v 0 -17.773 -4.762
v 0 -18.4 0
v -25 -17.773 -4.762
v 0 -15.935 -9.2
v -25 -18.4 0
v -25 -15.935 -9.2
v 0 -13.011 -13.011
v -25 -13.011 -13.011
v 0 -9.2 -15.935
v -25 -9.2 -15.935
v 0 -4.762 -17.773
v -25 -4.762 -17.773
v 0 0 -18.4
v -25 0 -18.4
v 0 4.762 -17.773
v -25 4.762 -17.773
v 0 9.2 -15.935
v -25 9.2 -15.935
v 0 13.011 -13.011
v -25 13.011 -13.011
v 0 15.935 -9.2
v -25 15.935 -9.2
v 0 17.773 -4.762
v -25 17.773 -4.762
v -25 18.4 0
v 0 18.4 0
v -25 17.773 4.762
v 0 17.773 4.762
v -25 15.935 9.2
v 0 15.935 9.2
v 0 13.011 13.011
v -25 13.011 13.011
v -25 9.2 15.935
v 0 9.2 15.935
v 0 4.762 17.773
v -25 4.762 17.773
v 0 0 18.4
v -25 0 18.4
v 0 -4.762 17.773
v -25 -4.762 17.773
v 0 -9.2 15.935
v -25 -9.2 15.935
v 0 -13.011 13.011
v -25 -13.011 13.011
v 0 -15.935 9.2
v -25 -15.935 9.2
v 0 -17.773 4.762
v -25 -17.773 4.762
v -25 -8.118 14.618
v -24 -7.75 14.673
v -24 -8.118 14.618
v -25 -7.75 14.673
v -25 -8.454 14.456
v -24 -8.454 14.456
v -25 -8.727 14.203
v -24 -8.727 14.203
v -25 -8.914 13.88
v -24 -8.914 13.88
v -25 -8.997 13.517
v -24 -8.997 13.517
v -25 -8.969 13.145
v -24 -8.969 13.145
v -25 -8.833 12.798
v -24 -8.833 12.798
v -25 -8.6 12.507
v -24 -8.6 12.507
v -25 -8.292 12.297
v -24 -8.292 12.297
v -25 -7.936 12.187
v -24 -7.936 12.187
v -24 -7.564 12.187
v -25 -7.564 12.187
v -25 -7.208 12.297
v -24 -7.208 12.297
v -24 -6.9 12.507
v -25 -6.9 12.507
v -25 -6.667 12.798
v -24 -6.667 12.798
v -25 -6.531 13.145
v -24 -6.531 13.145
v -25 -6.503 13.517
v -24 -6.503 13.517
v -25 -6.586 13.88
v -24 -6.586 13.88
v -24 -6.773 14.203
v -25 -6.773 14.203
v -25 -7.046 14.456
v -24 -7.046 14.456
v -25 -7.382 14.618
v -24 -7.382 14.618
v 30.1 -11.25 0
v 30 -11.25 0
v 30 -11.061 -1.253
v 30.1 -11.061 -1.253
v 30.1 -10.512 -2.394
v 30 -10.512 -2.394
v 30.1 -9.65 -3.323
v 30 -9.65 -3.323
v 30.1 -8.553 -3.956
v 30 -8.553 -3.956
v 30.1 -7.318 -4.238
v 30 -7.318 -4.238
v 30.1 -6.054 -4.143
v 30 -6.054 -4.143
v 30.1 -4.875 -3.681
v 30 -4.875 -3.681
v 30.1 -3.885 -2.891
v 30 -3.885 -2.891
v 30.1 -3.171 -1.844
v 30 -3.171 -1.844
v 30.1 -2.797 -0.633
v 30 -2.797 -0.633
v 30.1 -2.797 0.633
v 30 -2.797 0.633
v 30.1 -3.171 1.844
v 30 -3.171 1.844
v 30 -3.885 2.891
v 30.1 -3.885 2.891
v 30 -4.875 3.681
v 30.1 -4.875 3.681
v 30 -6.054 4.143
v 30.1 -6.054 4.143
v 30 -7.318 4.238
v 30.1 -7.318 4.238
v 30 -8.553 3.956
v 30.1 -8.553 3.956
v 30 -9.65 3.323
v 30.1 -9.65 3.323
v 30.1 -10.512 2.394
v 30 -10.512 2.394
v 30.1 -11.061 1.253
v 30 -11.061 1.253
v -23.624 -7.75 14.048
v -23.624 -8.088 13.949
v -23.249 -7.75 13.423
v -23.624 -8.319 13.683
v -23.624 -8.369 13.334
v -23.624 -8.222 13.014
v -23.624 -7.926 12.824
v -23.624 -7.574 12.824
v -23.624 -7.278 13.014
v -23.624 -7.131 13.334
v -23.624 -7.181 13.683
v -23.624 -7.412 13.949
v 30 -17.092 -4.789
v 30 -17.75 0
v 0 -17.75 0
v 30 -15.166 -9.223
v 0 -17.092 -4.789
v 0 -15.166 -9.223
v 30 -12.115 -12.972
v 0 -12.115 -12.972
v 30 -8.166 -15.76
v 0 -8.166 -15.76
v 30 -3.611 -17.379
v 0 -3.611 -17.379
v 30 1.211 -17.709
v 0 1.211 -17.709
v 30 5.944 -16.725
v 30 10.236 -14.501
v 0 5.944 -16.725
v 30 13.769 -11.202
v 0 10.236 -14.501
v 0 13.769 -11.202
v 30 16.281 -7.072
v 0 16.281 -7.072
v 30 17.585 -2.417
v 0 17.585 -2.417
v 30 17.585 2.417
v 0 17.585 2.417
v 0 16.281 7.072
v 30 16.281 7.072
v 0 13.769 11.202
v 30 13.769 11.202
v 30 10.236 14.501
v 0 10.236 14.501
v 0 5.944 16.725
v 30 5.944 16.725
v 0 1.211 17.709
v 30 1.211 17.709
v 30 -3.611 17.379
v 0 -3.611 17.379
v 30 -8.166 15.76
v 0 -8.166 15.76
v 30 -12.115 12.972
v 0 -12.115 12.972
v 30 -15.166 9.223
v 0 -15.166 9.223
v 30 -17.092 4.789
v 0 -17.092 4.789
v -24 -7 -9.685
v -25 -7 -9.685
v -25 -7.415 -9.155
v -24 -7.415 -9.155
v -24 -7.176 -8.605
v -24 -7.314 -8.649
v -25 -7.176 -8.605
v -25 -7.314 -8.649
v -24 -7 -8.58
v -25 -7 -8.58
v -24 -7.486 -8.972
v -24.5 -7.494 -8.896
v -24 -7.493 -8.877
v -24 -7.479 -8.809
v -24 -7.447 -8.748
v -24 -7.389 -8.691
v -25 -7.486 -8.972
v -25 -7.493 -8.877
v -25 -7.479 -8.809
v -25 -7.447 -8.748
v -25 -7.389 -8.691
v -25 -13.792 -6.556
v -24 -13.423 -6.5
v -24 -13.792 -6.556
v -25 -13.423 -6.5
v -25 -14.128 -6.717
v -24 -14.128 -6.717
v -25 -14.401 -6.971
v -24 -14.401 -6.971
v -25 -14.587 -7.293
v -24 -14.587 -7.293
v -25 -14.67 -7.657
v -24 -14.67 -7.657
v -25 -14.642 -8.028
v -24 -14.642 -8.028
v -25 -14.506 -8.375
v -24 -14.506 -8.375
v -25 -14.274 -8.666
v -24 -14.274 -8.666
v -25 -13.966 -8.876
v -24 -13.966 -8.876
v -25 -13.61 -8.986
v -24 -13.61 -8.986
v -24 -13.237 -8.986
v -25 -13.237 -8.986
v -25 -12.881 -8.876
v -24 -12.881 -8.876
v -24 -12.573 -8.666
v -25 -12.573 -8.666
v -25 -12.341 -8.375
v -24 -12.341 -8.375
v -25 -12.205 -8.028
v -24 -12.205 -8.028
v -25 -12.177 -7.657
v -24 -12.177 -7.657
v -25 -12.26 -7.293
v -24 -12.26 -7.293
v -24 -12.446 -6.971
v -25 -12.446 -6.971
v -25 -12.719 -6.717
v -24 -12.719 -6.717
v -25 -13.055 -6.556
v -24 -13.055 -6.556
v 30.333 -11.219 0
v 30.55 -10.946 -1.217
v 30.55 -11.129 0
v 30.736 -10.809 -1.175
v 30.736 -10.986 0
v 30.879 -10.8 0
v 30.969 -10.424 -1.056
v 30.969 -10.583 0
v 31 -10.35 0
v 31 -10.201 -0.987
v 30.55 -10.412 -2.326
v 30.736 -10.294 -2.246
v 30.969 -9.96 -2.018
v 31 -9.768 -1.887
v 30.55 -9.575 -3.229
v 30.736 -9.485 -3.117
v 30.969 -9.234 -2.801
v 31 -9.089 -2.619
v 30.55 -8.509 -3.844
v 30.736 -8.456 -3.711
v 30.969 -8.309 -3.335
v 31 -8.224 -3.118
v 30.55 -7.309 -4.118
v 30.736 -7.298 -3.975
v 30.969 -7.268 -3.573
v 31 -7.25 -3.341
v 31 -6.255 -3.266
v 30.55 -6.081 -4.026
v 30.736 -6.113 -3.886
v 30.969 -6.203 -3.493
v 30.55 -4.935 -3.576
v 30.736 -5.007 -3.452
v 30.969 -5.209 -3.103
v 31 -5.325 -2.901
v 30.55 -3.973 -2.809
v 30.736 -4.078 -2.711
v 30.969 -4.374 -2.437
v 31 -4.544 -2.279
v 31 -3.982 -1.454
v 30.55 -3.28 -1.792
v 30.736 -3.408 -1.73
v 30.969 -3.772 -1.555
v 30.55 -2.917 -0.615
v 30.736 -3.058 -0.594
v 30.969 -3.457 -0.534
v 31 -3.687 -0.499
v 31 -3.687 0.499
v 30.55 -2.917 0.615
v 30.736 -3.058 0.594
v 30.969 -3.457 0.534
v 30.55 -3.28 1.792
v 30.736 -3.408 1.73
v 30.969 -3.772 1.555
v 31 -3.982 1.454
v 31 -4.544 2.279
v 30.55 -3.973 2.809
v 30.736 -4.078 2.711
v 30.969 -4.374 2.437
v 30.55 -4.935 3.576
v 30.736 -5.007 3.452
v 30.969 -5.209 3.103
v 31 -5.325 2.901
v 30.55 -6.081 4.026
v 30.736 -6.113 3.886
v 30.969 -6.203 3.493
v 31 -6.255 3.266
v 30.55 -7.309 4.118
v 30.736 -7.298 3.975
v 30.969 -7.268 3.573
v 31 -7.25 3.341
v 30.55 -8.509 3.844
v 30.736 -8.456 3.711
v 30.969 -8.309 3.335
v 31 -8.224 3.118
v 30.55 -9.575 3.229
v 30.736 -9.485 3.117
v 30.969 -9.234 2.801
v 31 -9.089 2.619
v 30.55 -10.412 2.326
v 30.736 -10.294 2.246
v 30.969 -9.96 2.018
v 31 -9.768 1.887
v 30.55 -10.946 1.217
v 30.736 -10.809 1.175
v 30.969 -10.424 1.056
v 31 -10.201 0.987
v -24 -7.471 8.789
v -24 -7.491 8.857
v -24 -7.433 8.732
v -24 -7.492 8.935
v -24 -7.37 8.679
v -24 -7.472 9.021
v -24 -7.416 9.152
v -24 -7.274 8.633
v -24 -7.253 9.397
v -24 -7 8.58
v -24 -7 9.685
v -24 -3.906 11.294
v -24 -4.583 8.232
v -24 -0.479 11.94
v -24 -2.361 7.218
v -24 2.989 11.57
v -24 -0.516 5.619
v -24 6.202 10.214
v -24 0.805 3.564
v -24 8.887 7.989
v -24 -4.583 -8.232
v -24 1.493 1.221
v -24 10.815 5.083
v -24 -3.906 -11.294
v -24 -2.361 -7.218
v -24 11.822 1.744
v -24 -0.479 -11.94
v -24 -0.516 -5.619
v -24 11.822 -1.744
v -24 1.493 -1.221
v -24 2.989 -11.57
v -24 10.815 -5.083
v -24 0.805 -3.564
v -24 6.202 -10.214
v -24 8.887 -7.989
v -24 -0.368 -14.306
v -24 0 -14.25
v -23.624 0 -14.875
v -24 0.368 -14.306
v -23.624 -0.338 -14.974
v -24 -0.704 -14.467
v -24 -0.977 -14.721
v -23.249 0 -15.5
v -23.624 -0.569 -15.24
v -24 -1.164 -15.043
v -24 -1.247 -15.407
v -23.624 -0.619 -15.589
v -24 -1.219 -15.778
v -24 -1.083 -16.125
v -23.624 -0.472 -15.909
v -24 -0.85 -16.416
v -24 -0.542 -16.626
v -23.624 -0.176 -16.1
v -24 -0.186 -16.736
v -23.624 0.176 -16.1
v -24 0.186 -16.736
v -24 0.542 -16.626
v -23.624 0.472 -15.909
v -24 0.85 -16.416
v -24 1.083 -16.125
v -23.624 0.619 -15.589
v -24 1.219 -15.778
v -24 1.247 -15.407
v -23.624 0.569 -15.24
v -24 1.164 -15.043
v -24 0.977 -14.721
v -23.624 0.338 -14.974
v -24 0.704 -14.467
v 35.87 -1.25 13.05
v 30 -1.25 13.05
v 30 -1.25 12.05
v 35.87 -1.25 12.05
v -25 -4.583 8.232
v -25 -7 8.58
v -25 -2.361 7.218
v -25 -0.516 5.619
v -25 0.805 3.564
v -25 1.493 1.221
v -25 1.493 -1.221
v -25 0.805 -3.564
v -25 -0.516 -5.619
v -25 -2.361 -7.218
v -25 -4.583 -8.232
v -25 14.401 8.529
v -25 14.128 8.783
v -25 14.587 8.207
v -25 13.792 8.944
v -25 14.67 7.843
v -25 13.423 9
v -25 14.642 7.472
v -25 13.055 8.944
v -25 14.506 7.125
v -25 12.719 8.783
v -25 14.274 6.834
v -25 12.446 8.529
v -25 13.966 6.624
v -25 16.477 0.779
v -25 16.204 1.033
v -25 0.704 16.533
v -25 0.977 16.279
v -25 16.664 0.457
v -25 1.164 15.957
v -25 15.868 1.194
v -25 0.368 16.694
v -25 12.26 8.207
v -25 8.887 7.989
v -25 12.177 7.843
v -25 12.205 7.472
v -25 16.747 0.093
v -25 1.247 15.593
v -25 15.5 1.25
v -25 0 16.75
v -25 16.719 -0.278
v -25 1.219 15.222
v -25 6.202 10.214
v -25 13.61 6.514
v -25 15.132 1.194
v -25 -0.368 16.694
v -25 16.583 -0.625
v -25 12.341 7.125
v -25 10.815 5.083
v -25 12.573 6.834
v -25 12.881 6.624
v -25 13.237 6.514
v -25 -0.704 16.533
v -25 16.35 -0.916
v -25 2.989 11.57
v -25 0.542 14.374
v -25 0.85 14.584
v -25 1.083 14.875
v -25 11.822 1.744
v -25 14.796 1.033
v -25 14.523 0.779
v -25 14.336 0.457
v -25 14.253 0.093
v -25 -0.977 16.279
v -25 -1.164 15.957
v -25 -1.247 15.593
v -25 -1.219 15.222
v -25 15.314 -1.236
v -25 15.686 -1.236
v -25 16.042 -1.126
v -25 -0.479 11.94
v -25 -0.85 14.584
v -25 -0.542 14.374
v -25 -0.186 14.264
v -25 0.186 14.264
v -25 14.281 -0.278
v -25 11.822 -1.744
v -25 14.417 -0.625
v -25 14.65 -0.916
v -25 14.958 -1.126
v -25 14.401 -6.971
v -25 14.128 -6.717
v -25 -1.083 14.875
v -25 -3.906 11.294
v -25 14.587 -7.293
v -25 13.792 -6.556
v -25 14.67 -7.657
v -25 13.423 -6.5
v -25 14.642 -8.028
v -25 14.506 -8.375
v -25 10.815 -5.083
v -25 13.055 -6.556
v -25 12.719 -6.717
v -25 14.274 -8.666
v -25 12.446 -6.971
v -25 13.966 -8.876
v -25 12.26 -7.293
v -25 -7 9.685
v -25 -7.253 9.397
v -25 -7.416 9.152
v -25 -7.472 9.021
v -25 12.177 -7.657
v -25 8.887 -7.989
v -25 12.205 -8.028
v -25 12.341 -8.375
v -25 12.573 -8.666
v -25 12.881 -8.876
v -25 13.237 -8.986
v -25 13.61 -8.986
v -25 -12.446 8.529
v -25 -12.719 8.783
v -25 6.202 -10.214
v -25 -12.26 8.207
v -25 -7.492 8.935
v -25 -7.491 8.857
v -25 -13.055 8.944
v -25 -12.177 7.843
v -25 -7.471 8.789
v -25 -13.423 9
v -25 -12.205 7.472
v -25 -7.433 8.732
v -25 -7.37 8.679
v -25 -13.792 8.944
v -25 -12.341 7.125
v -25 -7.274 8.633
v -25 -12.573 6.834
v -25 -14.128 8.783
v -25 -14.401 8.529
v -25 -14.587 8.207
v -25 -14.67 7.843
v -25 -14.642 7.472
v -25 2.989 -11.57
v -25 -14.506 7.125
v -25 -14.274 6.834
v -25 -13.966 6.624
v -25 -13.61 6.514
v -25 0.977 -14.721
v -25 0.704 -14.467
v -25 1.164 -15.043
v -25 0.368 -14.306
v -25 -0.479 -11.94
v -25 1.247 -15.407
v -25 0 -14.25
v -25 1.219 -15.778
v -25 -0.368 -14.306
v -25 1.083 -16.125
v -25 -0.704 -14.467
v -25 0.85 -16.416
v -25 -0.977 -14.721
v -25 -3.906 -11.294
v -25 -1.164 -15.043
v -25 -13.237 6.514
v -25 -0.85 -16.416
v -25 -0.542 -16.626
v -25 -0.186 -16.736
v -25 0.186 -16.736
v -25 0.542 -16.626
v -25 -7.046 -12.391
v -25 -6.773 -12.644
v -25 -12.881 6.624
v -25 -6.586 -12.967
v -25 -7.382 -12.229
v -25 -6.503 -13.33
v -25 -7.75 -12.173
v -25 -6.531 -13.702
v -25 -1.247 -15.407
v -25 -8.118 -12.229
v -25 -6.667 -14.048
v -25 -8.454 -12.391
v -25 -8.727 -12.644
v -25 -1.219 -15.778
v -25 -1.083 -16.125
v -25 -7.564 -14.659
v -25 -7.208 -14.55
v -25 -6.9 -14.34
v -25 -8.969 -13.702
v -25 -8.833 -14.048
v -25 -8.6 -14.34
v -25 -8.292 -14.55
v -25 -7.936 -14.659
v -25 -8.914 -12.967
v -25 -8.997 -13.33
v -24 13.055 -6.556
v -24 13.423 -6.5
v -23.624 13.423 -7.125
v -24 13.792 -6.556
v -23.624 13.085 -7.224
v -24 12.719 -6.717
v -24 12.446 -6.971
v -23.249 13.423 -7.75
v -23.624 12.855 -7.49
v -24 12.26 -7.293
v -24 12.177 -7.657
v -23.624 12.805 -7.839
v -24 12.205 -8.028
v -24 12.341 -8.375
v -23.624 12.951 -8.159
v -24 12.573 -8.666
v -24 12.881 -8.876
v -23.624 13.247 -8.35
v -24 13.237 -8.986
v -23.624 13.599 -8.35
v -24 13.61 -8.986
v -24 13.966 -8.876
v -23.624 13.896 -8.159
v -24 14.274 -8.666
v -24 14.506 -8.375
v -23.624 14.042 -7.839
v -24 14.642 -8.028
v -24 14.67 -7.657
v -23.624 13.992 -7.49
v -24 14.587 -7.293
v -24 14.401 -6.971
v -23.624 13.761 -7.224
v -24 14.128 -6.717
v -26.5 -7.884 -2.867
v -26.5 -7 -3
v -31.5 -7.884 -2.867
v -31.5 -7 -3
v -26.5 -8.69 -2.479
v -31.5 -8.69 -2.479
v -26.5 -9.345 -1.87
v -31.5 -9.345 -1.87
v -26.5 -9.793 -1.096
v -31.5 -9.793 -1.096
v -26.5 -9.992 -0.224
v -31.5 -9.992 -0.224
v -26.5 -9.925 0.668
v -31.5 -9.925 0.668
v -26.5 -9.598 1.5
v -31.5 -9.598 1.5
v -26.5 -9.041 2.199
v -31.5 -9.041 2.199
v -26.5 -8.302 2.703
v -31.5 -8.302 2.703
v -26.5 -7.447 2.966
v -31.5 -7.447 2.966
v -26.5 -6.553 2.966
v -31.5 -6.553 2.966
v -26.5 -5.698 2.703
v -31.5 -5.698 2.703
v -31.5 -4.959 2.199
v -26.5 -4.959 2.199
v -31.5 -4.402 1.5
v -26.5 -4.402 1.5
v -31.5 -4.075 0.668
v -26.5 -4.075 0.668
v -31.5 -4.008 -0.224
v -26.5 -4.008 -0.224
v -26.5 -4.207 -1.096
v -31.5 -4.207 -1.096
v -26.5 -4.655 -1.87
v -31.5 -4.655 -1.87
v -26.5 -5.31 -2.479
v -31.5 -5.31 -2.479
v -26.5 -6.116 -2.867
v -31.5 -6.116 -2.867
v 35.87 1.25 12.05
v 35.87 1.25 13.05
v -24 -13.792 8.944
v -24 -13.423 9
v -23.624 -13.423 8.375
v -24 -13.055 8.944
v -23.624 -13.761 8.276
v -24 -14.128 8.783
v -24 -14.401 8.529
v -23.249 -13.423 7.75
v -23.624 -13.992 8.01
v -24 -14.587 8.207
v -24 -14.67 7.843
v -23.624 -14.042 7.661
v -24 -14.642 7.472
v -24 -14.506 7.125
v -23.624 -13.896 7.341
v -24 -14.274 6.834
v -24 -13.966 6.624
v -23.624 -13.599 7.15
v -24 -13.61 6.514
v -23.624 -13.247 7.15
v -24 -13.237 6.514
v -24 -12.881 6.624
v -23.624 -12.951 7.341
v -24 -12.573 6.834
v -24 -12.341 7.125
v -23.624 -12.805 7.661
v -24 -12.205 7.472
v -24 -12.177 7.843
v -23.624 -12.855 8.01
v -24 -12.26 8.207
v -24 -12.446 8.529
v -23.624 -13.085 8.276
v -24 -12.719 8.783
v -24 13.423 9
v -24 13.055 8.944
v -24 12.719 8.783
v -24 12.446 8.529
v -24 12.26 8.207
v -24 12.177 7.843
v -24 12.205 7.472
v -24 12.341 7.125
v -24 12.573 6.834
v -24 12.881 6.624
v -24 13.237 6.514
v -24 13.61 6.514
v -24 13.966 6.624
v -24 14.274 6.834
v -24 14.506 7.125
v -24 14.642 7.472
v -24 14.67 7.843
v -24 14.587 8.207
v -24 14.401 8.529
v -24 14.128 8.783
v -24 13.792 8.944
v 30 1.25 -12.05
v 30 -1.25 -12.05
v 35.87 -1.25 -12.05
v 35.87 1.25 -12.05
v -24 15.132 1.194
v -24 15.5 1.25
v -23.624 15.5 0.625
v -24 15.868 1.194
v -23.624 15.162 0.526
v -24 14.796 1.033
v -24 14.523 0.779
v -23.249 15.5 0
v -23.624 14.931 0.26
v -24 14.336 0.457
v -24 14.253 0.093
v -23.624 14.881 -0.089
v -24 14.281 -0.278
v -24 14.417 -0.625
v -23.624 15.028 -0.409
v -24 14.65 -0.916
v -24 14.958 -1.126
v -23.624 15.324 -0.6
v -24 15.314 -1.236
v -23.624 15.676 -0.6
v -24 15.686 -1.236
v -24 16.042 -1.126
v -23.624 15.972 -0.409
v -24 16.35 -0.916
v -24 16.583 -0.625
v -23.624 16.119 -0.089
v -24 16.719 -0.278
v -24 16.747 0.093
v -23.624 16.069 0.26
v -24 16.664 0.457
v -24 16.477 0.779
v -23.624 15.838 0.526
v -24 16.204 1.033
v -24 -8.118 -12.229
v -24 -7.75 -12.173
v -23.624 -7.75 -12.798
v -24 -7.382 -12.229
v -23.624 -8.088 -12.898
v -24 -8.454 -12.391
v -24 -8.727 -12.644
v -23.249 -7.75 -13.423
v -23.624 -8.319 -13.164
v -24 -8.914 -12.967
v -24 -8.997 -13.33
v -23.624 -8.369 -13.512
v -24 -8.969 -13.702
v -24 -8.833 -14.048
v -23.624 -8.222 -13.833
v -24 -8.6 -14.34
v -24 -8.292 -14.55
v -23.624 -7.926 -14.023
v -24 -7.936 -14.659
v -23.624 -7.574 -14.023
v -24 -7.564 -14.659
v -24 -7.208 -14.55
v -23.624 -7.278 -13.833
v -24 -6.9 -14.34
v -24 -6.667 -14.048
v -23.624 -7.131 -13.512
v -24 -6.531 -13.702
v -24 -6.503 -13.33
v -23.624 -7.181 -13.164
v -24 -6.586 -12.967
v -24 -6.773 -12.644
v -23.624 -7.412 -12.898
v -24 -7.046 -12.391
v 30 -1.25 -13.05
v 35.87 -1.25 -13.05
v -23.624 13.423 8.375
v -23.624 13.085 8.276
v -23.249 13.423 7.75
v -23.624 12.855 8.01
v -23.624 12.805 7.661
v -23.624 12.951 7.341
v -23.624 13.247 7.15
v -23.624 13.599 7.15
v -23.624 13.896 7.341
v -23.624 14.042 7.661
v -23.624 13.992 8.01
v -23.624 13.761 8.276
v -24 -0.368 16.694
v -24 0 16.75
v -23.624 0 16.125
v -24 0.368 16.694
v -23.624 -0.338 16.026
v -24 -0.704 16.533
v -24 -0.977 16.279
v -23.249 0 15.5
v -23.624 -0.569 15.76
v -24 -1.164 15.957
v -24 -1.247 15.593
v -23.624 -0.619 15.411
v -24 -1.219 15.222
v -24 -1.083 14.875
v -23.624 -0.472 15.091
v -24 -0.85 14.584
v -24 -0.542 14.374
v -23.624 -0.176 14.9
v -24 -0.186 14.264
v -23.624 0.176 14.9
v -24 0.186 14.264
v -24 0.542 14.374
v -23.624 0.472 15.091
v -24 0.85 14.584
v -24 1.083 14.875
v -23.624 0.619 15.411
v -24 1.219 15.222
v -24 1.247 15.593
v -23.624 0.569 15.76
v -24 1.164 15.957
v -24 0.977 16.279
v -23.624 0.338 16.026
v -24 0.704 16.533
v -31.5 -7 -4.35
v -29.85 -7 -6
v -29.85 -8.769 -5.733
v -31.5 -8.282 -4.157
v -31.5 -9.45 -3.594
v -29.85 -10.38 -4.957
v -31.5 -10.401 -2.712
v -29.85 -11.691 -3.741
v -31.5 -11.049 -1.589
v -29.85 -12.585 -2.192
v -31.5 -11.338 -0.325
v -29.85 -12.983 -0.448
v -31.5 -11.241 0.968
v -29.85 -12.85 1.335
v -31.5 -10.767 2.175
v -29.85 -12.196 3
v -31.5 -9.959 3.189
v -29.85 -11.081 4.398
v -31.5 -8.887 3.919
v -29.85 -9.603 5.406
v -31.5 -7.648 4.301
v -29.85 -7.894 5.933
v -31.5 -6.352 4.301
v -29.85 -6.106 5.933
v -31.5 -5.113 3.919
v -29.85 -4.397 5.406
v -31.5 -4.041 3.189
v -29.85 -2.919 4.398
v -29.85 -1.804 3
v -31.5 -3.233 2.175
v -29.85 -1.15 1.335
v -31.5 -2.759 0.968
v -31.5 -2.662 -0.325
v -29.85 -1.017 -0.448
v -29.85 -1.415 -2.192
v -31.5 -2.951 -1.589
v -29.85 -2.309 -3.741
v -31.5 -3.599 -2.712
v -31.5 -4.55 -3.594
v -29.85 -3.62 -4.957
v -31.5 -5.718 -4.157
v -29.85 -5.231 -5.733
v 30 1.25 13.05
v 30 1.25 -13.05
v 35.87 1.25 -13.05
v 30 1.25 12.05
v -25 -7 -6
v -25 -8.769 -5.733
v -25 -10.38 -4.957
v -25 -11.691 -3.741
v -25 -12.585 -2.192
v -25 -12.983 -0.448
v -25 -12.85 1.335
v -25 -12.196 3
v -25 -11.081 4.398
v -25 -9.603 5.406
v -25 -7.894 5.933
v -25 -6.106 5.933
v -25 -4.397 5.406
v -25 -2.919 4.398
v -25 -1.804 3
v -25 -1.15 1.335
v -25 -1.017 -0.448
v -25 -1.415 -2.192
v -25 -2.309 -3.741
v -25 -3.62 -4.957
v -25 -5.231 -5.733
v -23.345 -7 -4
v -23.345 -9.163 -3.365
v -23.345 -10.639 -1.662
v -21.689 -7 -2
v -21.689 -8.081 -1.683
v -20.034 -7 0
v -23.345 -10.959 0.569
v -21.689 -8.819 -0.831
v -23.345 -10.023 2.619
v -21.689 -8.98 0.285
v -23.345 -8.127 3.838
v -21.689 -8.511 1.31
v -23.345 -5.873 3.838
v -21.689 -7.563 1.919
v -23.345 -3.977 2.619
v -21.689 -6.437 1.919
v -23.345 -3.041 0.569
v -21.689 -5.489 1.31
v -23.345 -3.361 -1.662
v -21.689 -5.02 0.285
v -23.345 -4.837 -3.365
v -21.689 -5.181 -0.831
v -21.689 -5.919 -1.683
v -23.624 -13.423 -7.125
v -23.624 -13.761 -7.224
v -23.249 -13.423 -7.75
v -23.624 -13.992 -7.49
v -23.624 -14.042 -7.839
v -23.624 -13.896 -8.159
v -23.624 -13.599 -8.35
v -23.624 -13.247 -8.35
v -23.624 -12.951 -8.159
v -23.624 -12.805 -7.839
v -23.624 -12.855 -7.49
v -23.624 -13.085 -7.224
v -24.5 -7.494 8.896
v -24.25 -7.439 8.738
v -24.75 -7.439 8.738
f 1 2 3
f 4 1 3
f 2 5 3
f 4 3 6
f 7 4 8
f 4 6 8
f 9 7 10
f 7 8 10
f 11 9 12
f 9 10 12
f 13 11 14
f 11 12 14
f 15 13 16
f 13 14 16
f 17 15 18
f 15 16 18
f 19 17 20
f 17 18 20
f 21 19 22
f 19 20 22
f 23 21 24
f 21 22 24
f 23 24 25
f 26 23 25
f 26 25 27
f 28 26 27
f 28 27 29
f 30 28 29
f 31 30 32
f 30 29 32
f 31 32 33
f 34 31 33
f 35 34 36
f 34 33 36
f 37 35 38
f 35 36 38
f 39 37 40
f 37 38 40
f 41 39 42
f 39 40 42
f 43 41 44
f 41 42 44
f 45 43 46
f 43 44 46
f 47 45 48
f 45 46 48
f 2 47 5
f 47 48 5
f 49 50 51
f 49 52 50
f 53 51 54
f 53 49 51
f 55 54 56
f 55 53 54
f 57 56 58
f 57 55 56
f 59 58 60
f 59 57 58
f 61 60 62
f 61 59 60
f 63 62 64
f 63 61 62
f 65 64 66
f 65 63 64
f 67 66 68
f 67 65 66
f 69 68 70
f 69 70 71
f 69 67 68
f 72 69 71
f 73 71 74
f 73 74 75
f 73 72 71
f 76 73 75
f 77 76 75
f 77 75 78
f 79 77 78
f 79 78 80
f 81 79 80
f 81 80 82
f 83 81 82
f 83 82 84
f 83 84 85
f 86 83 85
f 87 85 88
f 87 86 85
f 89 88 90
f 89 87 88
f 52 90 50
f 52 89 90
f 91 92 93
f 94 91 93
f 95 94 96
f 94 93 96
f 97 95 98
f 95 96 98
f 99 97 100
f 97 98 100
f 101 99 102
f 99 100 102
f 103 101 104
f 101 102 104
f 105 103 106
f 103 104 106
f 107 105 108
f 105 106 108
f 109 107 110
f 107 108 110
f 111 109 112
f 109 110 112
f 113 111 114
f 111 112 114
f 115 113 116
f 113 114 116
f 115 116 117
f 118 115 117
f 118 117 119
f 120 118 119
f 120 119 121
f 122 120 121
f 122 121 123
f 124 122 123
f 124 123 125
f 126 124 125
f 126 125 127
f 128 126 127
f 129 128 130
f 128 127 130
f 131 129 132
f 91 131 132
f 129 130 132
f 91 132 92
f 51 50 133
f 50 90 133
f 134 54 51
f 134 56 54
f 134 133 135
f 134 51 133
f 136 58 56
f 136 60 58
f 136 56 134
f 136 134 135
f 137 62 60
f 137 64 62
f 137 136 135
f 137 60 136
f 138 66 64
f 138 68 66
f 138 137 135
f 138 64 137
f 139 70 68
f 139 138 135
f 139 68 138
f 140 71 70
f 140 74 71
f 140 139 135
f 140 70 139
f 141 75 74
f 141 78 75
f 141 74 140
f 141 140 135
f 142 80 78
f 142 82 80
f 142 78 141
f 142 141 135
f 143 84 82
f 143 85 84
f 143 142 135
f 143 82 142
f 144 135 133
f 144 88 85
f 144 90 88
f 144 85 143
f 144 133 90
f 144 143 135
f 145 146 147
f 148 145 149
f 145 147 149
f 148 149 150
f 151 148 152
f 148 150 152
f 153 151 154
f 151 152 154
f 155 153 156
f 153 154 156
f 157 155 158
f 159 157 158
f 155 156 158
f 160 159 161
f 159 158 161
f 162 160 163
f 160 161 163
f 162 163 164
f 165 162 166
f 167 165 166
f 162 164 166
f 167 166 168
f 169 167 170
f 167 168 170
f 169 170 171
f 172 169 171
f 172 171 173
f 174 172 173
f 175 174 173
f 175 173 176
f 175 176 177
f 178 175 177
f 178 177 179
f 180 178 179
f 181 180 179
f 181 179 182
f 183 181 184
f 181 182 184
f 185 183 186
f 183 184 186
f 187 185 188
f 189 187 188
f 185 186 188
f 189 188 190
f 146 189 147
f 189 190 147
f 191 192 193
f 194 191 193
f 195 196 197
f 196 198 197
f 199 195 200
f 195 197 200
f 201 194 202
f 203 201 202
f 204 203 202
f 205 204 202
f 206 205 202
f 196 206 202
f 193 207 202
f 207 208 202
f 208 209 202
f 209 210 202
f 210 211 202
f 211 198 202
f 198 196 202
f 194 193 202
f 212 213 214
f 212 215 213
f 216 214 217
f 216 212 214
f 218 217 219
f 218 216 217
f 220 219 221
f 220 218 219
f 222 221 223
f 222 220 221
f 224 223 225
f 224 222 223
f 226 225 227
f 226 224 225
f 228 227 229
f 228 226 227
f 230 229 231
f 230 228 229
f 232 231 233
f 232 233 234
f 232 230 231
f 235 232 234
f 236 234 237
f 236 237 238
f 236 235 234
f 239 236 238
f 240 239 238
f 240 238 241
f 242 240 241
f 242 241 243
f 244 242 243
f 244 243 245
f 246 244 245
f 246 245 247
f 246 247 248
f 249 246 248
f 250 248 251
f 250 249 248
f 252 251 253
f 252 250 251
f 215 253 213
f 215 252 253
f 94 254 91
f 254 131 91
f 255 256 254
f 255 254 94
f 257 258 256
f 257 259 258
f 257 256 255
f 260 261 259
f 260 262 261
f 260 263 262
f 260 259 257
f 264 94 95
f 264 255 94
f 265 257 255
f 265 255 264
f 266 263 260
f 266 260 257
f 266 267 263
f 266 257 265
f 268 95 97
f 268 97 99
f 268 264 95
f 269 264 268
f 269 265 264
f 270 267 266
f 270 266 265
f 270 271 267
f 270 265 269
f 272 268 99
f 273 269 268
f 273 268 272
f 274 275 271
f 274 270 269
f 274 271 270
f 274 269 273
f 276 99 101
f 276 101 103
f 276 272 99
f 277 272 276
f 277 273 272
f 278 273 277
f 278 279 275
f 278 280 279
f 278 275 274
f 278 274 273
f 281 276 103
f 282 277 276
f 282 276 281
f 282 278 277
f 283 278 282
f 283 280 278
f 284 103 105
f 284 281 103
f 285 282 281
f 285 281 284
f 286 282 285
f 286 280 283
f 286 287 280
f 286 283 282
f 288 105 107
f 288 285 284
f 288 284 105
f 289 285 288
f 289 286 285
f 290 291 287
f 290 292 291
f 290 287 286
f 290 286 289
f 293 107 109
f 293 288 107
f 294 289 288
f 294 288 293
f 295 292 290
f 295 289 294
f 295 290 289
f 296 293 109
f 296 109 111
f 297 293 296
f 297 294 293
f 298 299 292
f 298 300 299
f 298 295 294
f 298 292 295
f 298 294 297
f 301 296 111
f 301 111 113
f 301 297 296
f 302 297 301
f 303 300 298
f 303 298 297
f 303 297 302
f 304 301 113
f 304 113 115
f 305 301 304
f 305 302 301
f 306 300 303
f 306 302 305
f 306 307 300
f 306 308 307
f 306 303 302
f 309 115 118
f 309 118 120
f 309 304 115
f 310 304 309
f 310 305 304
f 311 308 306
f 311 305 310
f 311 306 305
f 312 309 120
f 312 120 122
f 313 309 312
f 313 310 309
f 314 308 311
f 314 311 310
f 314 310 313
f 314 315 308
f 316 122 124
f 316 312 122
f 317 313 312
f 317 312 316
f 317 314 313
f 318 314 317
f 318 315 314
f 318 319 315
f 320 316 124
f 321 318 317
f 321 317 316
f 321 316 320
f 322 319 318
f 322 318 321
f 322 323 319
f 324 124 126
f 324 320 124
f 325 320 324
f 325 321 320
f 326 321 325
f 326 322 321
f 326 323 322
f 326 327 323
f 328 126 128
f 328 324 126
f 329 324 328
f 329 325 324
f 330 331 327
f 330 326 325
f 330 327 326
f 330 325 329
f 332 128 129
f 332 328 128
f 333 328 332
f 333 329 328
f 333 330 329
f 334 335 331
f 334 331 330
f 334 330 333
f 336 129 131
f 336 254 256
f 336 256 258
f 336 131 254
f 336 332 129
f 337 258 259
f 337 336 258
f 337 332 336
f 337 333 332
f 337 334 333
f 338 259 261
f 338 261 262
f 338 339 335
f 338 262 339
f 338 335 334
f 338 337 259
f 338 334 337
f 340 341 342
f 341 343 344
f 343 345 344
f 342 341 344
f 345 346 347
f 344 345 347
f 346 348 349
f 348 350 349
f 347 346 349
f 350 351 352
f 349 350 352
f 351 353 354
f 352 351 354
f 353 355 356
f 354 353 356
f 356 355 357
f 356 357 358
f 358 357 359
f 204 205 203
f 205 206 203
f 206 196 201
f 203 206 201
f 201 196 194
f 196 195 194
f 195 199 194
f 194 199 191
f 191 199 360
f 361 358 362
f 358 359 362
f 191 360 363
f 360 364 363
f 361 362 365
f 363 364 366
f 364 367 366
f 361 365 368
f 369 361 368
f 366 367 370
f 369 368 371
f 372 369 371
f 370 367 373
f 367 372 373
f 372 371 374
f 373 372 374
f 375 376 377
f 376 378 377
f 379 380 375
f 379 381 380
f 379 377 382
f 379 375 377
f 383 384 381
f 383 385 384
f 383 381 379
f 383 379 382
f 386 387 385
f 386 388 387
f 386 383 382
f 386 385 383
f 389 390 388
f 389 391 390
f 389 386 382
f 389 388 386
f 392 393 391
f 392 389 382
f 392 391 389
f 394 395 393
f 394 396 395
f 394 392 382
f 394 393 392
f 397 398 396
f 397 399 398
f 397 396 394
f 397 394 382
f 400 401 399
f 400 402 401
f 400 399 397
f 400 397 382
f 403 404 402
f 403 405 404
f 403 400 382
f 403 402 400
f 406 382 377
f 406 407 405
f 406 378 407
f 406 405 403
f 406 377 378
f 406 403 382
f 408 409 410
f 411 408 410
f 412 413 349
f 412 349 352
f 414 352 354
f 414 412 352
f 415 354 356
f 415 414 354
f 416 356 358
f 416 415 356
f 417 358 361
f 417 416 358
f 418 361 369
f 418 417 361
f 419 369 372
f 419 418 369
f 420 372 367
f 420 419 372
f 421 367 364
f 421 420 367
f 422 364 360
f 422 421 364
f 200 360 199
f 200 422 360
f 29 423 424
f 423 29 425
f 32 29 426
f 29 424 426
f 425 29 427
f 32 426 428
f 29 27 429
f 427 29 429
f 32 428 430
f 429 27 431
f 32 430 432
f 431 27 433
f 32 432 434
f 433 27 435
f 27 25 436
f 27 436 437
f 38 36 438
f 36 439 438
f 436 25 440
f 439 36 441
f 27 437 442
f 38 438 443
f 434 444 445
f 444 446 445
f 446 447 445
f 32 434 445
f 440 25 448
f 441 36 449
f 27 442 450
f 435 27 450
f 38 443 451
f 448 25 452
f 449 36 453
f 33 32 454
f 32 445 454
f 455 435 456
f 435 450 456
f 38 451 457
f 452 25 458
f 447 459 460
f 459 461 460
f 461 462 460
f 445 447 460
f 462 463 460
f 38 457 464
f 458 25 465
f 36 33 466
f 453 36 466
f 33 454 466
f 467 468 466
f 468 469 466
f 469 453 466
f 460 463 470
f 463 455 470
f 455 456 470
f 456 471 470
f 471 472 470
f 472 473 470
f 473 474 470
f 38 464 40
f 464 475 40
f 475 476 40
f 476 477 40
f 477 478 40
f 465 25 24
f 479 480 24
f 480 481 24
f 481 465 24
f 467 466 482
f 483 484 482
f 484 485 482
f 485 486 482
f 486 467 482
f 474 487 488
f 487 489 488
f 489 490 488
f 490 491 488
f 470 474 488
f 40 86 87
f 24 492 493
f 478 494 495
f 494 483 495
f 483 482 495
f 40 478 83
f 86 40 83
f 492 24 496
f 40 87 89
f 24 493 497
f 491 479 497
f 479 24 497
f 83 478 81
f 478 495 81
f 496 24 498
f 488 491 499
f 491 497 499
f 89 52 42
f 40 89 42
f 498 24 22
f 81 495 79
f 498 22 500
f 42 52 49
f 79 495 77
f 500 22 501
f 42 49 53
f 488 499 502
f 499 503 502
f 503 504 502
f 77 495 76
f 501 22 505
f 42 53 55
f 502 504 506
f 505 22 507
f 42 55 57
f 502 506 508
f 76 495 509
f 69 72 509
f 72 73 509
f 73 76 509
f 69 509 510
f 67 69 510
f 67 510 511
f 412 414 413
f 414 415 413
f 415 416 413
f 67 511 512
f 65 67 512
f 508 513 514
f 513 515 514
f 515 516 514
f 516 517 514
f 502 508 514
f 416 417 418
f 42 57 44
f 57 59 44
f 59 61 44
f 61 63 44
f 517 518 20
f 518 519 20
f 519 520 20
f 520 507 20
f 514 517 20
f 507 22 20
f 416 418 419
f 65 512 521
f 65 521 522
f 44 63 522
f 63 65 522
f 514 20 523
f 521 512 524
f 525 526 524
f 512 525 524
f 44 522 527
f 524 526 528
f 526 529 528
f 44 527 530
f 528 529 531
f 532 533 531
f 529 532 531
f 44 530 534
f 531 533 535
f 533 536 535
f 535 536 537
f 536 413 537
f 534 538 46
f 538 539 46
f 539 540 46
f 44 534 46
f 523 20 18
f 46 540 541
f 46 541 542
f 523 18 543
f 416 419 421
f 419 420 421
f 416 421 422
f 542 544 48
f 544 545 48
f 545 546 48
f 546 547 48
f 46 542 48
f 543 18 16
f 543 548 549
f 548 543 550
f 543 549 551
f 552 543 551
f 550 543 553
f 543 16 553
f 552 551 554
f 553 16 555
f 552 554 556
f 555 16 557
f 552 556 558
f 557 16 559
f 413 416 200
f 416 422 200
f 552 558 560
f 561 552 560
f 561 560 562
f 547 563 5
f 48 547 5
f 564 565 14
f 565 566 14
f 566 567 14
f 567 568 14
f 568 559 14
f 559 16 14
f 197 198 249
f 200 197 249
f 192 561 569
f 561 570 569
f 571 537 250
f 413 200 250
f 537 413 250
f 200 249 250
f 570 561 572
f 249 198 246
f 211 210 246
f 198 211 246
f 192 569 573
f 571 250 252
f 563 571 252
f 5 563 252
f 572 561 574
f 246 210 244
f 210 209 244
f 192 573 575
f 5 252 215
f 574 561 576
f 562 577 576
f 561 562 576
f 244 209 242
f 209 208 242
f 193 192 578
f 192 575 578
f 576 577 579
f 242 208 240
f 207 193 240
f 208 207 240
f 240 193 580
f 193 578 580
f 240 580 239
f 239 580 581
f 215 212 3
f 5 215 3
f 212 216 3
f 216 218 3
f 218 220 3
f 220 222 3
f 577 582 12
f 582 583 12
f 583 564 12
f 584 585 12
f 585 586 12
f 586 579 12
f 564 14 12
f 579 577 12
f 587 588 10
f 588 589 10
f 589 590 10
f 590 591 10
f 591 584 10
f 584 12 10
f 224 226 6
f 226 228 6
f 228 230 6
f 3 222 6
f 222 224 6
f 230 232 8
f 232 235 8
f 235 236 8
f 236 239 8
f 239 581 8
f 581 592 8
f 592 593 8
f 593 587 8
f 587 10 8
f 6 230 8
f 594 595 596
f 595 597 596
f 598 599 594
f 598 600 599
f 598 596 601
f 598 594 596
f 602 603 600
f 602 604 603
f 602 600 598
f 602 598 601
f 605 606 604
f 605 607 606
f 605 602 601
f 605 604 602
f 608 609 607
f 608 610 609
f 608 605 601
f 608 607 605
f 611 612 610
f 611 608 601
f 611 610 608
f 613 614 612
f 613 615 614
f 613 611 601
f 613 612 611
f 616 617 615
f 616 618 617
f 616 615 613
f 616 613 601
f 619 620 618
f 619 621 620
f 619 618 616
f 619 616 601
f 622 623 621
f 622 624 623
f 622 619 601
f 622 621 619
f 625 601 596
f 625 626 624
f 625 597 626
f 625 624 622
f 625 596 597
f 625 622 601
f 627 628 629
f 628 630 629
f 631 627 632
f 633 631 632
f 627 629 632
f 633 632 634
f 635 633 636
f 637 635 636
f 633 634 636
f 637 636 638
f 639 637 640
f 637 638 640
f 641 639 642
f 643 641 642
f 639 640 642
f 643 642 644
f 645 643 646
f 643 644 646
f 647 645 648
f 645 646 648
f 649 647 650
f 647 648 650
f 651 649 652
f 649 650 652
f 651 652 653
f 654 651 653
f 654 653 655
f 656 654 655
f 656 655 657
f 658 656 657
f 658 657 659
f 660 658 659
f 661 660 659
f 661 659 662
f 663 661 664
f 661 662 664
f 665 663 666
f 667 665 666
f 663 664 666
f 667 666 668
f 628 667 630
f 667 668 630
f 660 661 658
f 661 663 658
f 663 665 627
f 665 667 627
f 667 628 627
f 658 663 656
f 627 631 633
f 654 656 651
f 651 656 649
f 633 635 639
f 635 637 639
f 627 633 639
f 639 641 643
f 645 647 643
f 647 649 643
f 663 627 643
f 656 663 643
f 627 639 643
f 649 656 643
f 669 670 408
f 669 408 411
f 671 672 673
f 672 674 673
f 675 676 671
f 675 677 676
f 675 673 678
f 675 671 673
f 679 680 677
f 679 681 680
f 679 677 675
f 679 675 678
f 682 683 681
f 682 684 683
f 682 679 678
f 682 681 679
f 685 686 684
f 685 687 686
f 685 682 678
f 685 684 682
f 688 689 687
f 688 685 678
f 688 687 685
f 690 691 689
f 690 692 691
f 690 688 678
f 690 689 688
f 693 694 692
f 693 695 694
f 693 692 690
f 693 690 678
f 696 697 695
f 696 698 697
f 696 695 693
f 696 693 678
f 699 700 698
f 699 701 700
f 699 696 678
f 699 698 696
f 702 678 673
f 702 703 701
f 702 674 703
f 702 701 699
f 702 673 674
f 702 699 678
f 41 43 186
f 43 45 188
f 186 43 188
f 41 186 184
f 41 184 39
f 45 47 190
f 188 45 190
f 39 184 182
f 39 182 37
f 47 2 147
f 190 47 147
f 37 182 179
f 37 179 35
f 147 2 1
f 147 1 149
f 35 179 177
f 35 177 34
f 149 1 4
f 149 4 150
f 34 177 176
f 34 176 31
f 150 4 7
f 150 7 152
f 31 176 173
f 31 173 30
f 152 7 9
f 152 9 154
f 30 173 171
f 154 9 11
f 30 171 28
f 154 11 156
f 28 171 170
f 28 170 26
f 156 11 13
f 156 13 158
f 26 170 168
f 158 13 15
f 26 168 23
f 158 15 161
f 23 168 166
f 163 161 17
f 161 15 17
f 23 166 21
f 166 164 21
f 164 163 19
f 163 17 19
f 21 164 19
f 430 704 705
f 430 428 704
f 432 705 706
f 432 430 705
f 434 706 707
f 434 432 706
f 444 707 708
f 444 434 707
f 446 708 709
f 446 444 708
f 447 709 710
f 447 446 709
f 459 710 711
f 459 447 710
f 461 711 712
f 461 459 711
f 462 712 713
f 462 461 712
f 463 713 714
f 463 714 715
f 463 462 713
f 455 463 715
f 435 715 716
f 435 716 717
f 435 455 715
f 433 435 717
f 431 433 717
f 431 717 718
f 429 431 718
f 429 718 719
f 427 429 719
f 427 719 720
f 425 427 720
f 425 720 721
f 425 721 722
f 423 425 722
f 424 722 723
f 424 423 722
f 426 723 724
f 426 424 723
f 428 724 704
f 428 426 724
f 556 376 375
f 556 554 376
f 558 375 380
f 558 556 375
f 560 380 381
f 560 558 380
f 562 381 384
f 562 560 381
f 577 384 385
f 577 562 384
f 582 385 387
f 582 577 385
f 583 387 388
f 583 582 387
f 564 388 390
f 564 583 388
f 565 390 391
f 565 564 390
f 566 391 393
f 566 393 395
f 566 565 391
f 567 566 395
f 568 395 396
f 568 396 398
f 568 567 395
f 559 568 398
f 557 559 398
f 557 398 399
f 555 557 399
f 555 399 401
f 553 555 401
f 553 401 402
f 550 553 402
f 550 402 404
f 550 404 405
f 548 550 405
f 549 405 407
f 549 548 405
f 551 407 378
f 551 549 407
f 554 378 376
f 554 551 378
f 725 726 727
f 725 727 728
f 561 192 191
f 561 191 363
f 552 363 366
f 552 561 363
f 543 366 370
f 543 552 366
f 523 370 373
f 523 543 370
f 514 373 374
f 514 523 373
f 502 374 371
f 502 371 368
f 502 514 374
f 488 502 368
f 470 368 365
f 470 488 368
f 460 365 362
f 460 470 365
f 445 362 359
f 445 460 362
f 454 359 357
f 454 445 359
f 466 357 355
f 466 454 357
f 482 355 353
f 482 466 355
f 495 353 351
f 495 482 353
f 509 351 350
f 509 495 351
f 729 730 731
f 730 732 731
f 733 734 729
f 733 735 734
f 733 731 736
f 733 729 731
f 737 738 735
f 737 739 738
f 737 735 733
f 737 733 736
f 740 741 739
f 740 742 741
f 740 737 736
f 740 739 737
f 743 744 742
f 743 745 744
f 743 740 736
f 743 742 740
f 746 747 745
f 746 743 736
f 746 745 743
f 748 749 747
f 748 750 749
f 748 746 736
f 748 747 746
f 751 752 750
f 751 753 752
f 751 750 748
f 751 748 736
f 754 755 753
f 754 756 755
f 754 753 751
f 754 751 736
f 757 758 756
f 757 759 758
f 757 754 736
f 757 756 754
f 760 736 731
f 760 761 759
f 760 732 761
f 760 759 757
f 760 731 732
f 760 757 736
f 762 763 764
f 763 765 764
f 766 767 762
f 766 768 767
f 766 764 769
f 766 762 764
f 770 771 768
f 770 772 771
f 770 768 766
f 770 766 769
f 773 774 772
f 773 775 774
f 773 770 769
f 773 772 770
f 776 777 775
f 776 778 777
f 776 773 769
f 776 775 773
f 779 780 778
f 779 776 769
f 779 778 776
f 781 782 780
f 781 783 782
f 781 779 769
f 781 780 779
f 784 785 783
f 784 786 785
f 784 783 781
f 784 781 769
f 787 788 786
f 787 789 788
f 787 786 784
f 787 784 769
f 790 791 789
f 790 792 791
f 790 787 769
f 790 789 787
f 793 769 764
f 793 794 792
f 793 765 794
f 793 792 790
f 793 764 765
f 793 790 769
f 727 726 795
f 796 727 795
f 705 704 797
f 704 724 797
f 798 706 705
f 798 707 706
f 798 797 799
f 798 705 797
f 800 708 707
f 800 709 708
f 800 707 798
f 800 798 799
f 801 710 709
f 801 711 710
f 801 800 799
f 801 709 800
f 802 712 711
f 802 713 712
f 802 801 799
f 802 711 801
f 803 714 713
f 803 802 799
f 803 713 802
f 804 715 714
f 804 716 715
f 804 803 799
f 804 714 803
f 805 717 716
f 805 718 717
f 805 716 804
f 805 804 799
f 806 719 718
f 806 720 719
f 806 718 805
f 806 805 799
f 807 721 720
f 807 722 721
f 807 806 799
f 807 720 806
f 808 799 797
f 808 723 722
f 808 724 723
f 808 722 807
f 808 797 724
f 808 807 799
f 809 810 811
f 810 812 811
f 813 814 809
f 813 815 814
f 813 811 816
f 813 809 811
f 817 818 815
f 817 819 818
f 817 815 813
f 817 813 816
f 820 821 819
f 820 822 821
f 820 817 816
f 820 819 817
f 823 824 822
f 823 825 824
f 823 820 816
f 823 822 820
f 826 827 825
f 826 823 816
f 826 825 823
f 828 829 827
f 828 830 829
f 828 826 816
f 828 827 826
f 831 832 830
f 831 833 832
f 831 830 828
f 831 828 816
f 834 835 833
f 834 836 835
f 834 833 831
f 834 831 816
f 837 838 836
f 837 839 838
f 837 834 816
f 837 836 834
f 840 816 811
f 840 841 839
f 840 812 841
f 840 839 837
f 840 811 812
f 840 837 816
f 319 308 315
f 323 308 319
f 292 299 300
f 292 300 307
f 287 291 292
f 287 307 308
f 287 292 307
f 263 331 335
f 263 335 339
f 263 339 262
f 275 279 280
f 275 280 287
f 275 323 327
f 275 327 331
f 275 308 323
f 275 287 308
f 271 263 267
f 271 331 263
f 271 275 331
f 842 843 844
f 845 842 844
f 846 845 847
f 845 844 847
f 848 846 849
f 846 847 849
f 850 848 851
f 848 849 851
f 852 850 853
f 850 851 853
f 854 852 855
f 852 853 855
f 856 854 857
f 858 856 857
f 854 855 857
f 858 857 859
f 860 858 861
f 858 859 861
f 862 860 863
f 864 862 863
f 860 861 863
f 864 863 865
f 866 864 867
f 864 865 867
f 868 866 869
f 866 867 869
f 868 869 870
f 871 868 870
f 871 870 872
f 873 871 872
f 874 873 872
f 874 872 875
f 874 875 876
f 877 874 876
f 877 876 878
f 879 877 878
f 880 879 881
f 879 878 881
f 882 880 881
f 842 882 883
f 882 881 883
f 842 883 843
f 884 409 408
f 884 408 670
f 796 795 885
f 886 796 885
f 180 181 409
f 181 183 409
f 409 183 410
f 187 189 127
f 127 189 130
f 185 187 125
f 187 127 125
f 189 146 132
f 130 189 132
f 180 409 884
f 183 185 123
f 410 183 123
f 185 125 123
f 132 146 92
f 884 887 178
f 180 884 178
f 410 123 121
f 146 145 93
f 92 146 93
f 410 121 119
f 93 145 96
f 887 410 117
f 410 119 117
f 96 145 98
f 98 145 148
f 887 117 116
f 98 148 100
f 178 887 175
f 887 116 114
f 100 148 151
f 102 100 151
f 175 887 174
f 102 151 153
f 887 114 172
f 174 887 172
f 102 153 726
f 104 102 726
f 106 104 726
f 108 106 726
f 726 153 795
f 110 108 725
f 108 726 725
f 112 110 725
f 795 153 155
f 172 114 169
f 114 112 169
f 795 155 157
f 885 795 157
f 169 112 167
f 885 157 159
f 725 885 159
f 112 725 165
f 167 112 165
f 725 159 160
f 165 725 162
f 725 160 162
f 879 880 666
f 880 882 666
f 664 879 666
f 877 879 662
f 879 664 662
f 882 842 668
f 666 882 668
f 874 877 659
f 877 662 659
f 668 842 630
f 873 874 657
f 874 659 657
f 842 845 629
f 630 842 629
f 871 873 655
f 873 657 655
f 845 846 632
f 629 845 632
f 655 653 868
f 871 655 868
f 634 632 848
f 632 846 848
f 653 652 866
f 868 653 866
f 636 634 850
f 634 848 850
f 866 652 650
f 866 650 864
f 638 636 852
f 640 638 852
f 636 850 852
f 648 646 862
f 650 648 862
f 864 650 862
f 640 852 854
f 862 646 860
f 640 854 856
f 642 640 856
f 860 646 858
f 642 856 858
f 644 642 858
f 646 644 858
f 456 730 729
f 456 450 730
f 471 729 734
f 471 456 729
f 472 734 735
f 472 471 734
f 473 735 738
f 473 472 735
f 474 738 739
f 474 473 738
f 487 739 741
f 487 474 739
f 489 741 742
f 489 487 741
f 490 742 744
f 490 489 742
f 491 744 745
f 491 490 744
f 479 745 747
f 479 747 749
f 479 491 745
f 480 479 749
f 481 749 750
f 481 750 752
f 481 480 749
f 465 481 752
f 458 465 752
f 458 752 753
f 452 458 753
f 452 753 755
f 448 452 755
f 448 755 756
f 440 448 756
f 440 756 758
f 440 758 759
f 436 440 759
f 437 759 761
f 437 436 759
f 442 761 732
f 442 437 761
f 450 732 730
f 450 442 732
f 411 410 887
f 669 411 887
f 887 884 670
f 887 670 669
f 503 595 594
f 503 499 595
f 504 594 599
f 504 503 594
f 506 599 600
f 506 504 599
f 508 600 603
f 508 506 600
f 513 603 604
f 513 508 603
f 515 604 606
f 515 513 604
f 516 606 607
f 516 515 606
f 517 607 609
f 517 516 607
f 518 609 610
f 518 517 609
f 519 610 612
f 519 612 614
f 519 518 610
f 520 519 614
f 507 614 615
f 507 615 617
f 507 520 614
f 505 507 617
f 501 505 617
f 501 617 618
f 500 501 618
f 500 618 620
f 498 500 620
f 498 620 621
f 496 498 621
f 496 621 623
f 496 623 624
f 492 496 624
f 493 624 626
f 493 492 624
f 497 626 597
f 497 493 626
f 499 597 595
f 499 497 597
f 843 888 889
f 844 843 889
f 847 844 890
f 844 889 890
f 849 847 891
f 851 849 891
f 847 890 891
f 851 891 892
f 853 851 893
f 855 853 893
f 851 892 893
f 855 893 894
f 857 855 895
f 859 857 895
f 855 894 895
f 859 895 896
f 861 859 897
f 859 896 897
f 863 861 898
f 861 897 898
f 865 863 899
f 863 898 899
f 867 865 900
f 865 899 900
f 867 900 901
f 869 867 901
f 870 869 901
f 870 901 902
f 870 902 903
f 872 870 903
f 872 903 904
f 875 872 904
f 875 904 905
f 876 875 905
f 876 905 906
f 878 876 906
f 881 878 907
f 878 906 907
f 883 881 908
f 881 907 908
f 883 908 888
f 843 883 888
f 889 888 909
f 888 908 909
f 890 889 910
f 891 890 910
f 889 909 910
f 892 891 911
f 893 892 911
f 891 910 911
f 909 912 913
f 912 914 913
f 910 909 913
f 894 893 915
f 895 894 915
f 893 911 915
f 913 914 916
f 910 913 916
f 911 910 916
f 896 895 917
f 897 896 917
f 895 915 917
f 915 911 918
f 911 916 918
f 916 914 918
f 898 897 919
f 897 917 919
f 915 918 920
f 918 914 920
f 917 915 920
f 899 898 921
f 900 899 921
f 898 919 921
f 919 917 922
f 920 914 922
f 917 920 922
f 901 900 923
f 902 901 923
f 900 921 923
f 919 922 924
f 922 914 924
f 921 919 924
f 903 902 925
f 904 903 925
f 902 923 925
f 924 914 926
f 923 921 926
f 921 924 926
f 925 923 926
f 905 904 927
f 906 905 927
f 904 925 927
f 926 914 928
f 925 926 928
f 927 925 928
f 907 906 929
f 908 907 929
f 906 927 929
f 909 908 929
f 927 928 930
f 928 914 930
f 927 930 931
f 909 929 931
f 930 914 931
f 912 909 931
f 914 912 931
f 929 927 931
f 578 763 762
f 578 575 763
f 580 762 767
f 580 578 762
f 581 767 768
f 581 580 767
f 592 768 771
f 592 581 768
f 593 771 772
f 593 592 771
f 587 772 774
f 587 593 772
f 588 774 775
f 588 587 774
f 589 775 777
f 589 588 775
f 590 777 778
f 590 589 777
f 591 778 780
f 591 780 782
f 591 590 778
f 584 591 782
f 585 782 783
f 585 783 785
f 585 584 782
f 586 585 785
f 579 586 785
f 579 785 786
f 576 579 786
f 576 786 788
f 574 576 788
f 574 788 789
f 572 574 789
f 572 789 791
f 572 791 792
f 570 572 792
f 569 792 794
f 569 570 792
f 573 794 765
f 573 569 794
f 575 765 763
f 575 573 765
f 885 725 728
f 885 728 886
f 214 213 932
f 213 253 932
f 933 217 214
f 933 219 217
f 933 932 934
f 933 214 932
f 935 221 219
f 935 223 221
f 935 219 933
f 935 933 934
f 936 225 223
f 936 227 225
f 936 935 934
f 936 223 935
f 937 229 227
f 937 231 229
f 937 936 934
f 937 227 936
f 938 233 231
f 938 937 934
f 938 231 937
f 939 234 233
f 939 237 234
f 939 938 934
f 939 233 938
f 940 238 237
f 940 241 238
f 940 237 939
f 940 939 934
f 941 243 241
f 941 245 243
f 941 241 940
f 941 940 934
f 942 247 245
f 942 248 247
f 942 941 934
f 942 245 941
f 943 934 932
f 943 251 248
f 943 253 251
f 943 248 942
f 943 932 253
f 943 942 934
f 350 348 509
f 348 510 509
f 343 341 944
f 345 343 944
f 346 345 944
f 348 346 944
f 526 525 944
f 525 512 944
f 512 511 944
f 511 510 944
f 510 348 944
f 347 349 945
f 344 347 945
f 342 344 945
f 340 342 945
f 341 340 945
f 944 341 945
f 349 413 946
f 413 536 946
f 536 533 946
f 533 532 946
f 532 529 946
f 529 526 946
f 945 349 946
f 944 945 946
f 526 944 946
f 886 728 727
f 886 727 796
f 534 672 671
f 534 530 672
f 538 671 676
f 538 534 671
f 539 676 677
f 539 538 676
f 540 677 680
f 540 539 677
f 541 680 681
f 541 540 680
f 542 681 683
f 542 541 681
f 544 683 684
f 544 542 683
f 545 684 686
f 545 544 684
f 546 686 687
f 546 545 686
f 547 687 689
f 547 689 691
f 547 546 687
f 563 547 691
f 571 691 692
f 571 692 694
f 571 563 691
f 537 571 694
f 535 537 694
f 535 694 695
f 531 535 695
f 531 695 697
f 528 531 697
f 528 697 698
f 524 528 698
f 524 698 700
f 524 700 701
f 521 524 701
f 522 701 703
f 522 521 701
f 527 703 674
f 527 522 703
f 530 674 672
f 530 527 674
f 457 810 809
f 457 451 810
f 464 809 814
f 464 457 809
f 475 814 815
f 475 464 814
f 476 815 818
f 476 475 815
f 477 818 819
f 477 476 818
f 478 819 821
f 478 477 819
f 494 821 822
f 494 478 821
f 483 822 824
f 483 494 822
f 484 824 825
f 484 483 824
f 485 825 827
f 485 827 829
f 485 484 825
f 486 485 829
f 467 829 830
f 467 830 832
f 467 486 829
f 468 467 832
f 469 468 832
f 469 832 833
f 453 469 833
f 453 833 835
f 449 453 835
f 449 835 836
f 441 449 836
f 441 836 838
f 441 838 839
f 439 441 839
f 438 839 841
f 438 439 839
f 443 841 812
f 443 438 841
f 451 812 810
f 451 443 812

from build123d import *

# Parameters (mm, degrees)
SKETCH2_R                      = 4.25
BOSS_EXTRUDE1_DEPTH            = 1
FILLET1_R                      = 0.9
CHAMFER1_SIZE                  = 1.65
M3X0_5_TAPPED_HOLE2_AT_2_COUNT = 2
M3X0_5_TAPPED_HOLE2_AT_2_PITCH = 15.5
M3X0_5_TAPPED_HOLE2_AT_3_COUNT = 2
M3X0_5_TAPPED_HOLE2_AT_3_PITCH = 21.920310217
M3X0_5_TAPPED_HOLE2_AT_4_COUNT = 2
M3X0_5_TAPPED_HOLE2_AT_4_PITCH = 26.846787517
M3X0_5_TAPPED_HOLE2_AT_5_COUNT = 2
M3X0_5_TAPPED_HOLE2_AT_5_PITCH = 31
M3X0_5_TAPPED_HOLE2_AT_6_COUNT = 2
M3X0_5_TAPPED_HOLE2_AT_6_PITCH = 29.943700615
M3X0_5_TAPPED_HOLE2_AT_7_COUNT = 2
M3X0_5_TAPPED_HOLE2_AT_7_PITCH = 26.846787517
M3X0_5_TAPPED_HOLE2_AT_8_COUNT = 2
M3X0_5_TAPPED_HOLE2_AT_8_PITCH = 15.5
M3X0_5_TAPPED_HOLE2_AT_9_COUNT = 2
M3X0_5_TAPPED_HOLE2_AT_9_PITCH = 8.023390398
CUT_EXTRUDE3_DEPTH             = 1
SKETCH12_W                     = 1
SKETCH12_H                     = 2.5
BOSS_EXTRUDE3_DEPTH            = 5.87


with BuildPart() as part:
    # Sketch1 → Revolve1 (revolve)
    with BuildSketch(Plane.XY, mode=Mode.PRIVATE) as revolve1_sk:
        Polygon((30, 0), (30, 17.75), (0, 17.75), (0, 18.4), (-25, 18.4), (-25, 0), align=None)
    revolve(revolve1_sk.sketch.rotate(Axis((-25, 0, 0), (1, 0, 0)), 180), axis=Axis((-25, 0, 0), (1, 0, 0)))

    # Sketch2 → Boss-Extrude1 (add)
    with BuildSketch(Plane(origin=(30, 0, 0), x_dir=(0, 0, -1), z_dir=(1, 0, 0))):
        with Locations(Location((0, -7, 0), (0, 0, 270))):
            Circle(SKETCH2_R)
    extrude(amount=BOSS_EXTRUDE1_DEPTH)

    # Fillet1
    fillet1_edges = [part.edges().sort_by_distance(p)[0] for p in [
        (31, -2.75, 0),
    ]]
    fillet(fillet1_edges, radius=FILLET1_R)

    # Sketch11 → M3x0.5 Tapped Hole2 (revolve, cut)
    with BuildSketch(Plane(origin=(-25, 0, -15.5), x_dir=(0, 0, 1), z_dir=(0, 1, 0))):
        Polygon((0, 0), (0, 1.751075774), (1.25, 1), (1.25, 0), align=None)
    m3x0_5_tapped_hole2 = revolve(axis=Axis((-31.35, 0, -15.5), (1, 0, 0)), mode=Mode.SUBTRACT)

    # M3x0.5 Tapped Hole2 at 2: M3x0.5 Tapped Hole2 ×2
    with Locations(*[Vector(0, 0.8660254037844387, 0.5000000000000001) * (i * M3X0_5_TAPPED_HOLE2_AT_2_PITCH) for i in range(1, M3X0_5_TAPPED_HOLE2_AT_2_COUNT)]):
        add(m3x0_5_tapped_hole2, mode=Mode.SUBTRACT)

    # M3x0.5 Tapped Hole2 at 3: M3x0.5 Tapped Hole2 ×2
    with Locations(*[Vector(0, 0.7071067811865476, 0.7071067811865475) * (i * M3X0_5_TAPPED_HOLE2_AT_3_PITCH) for i in range(1, M3X0_5_TAPPED_HOLE2_AT_3_COUNT)]):
        add(m3x0_5_tapped_hole2, mode=Mode.SUBTRACT)

    # M3x0.5 Tapped Hole2 at 4: M3x0.5 Tapped Hole2 ×2
    with Locations(*[Vector(0, 0.5000000000000182, 0.8660254037844283) * (i * M3X0_5_TAPPED_HOLE2_AT_4_PITCH) for i in range(1, M3X0_5_TAPPED_HOLE2_AT_4_COUNT)]):
        add(m3x0_5_tapped_hole2, mode=Mode.SUBTRACT)

    # M3x0.5 Tapped Hole2 at 5: M3x0.5 Tapped Hole2 ×2
    with Locations(*[(0, 0, i * M3X0_5_TAPPED_HOLE2_AT_5_PITCH) for i in range(1, M3X0_5_TAPPED_HOLE2_AT_5_COUNT)]):
        add(m3x0_5_tapped_hole2, mode=Mode.SUBTRACT)

    # M3x0.5 Tapped Hole2 at 6: M3x0.5 Tapped Hole2 ×2
    with Locations(*[Vector(0, -0.25881904510249465, 0.9659258262890753) * (i * M3X0_5_TAPPED_HOLE2_AT_6_PITCH) for i in range(1, M3X0_5_TAPPED_HOLE2_AT_6_COUNT)]):
        add(m3x0_5_tapped_hole2, mode=Mode.SUBTRACT)

    # M3x0.5 Tapped Hole2 at 7: M3x0.5 Tapped Hole2 ×2
    with Locations(*[Vector(0, -0.49999999999998174, 0.8660254037844493) * (i * M3X0_5_TAPPED_HOLE2_AT_7_PITCH) for i in range(1, M3X0_5_TAPPED_HOLE2_AT_7_COUNT)]):
        add(m3x0_5_tapped_hole2, mode=Mode.SUBTRACT)

    # M3x0.5 Tapped Hole2 at 8: M3x0.5 Tapped Hole2 ×2
    with Locations(*[Vector(0, -0.8660254037844072, 0.5000000000000545) * (i * M3X0_5_TAPPED_HOLE2_AT_8_PITCH) for i in range(1, M3X0_5_TAPPED_HOLE2_AT_8_COUNT)]):
        add(m3x0_5_tapped_hole2, mode=Mode.SUBTRACT)

    # M3x0.5 Tapped Hole2 at 9: M3x0.5 Tapped Hole2 ×2
    with Locations(*[Vector(0, -0.9659258262890423, 0.25881904510261794) * (i * M3X0_5_TAPPED_HOLE2_AT_9_PITCH) for i in range(1, M3X0_5_TAPPED_HOLE2_AT_9_COUNT)]):
        add(m3x0_5_tapped_hole2, mode=Mode.SUBTRACT)

    # Sketch7 → Cut-Extrude3 (cut)
    with BuildSketch(Plane.ZY.offset(25)):
        with BuildLine():
            ThreePointArc((-9.685169074, -7), (0, 11.95), (9.685169074, -7))
            add(Edge.make_bspline(
                [(8.58, -7), (8.659297907, -7.987769276), (9.685169074, -7)],
                knots=[0, 0, 0, 1, 1, 1], degree=2))
            ThreePointArc((8.58, -7), (0, 1.58), (-8.58, -7))
            add(Edge.make_bspline(
                [(-9.685169074, -7), (-8.659297907, -7.987769276), (-8.58, -7)],
                knots=[0, 0, 0, 1, 1, 1], degree=2))
        make_face()
    extrude(amount=-CUT_EXTRUDE3_DEPTH, mode=Mode.SUBTRACT)

    # Sketch12 → Boss-Extrude3 (add)
    with BuildSketch(Plane(origin=(30, 0, 0), x_dir=(0, 0, -1), z_dir=(1, 0, 0))):
        with Locations((12.55, 0)):
            Rectangle(SKETCH12_W, SKETCH12_H)
        with Locations((-12.55, 0)):
            Rectangle(SKETCH12_W, SKETCH12_H)
    extrude(amount=BOSS_EXTRUDE3_DEPTH)


with BuildPart() as body_2:
    # Sketch4 → Revolve2 (revolve)
    with BuildSketch(Plane.XY, mode=Mode.PRIVATE) as revolve2_sk:
        Polygon((-20.034069856, -7), (-26.5, -7), (-26.5, -4), (-31.5, -4), (-31.5, -1), (-25, -1), align=None)
    revolve(revolve2_sk.sketch.rotate(Axis((30.1, -7, 0), (-1, 0, 0)), 90), axis=Axis((30.1, -7, 0), (-1, 0, 0)))

    # Chamfer1
    chamfer1_edges = [body_2.edges().sort_by_distance(p)[0] for p in [
        (-31.5, -7, 6),
    ]]
    chamfer(chamfer1_edges, length=CHAMFER1_SIZE)


solid = Compound([part.part, body_2.part])
